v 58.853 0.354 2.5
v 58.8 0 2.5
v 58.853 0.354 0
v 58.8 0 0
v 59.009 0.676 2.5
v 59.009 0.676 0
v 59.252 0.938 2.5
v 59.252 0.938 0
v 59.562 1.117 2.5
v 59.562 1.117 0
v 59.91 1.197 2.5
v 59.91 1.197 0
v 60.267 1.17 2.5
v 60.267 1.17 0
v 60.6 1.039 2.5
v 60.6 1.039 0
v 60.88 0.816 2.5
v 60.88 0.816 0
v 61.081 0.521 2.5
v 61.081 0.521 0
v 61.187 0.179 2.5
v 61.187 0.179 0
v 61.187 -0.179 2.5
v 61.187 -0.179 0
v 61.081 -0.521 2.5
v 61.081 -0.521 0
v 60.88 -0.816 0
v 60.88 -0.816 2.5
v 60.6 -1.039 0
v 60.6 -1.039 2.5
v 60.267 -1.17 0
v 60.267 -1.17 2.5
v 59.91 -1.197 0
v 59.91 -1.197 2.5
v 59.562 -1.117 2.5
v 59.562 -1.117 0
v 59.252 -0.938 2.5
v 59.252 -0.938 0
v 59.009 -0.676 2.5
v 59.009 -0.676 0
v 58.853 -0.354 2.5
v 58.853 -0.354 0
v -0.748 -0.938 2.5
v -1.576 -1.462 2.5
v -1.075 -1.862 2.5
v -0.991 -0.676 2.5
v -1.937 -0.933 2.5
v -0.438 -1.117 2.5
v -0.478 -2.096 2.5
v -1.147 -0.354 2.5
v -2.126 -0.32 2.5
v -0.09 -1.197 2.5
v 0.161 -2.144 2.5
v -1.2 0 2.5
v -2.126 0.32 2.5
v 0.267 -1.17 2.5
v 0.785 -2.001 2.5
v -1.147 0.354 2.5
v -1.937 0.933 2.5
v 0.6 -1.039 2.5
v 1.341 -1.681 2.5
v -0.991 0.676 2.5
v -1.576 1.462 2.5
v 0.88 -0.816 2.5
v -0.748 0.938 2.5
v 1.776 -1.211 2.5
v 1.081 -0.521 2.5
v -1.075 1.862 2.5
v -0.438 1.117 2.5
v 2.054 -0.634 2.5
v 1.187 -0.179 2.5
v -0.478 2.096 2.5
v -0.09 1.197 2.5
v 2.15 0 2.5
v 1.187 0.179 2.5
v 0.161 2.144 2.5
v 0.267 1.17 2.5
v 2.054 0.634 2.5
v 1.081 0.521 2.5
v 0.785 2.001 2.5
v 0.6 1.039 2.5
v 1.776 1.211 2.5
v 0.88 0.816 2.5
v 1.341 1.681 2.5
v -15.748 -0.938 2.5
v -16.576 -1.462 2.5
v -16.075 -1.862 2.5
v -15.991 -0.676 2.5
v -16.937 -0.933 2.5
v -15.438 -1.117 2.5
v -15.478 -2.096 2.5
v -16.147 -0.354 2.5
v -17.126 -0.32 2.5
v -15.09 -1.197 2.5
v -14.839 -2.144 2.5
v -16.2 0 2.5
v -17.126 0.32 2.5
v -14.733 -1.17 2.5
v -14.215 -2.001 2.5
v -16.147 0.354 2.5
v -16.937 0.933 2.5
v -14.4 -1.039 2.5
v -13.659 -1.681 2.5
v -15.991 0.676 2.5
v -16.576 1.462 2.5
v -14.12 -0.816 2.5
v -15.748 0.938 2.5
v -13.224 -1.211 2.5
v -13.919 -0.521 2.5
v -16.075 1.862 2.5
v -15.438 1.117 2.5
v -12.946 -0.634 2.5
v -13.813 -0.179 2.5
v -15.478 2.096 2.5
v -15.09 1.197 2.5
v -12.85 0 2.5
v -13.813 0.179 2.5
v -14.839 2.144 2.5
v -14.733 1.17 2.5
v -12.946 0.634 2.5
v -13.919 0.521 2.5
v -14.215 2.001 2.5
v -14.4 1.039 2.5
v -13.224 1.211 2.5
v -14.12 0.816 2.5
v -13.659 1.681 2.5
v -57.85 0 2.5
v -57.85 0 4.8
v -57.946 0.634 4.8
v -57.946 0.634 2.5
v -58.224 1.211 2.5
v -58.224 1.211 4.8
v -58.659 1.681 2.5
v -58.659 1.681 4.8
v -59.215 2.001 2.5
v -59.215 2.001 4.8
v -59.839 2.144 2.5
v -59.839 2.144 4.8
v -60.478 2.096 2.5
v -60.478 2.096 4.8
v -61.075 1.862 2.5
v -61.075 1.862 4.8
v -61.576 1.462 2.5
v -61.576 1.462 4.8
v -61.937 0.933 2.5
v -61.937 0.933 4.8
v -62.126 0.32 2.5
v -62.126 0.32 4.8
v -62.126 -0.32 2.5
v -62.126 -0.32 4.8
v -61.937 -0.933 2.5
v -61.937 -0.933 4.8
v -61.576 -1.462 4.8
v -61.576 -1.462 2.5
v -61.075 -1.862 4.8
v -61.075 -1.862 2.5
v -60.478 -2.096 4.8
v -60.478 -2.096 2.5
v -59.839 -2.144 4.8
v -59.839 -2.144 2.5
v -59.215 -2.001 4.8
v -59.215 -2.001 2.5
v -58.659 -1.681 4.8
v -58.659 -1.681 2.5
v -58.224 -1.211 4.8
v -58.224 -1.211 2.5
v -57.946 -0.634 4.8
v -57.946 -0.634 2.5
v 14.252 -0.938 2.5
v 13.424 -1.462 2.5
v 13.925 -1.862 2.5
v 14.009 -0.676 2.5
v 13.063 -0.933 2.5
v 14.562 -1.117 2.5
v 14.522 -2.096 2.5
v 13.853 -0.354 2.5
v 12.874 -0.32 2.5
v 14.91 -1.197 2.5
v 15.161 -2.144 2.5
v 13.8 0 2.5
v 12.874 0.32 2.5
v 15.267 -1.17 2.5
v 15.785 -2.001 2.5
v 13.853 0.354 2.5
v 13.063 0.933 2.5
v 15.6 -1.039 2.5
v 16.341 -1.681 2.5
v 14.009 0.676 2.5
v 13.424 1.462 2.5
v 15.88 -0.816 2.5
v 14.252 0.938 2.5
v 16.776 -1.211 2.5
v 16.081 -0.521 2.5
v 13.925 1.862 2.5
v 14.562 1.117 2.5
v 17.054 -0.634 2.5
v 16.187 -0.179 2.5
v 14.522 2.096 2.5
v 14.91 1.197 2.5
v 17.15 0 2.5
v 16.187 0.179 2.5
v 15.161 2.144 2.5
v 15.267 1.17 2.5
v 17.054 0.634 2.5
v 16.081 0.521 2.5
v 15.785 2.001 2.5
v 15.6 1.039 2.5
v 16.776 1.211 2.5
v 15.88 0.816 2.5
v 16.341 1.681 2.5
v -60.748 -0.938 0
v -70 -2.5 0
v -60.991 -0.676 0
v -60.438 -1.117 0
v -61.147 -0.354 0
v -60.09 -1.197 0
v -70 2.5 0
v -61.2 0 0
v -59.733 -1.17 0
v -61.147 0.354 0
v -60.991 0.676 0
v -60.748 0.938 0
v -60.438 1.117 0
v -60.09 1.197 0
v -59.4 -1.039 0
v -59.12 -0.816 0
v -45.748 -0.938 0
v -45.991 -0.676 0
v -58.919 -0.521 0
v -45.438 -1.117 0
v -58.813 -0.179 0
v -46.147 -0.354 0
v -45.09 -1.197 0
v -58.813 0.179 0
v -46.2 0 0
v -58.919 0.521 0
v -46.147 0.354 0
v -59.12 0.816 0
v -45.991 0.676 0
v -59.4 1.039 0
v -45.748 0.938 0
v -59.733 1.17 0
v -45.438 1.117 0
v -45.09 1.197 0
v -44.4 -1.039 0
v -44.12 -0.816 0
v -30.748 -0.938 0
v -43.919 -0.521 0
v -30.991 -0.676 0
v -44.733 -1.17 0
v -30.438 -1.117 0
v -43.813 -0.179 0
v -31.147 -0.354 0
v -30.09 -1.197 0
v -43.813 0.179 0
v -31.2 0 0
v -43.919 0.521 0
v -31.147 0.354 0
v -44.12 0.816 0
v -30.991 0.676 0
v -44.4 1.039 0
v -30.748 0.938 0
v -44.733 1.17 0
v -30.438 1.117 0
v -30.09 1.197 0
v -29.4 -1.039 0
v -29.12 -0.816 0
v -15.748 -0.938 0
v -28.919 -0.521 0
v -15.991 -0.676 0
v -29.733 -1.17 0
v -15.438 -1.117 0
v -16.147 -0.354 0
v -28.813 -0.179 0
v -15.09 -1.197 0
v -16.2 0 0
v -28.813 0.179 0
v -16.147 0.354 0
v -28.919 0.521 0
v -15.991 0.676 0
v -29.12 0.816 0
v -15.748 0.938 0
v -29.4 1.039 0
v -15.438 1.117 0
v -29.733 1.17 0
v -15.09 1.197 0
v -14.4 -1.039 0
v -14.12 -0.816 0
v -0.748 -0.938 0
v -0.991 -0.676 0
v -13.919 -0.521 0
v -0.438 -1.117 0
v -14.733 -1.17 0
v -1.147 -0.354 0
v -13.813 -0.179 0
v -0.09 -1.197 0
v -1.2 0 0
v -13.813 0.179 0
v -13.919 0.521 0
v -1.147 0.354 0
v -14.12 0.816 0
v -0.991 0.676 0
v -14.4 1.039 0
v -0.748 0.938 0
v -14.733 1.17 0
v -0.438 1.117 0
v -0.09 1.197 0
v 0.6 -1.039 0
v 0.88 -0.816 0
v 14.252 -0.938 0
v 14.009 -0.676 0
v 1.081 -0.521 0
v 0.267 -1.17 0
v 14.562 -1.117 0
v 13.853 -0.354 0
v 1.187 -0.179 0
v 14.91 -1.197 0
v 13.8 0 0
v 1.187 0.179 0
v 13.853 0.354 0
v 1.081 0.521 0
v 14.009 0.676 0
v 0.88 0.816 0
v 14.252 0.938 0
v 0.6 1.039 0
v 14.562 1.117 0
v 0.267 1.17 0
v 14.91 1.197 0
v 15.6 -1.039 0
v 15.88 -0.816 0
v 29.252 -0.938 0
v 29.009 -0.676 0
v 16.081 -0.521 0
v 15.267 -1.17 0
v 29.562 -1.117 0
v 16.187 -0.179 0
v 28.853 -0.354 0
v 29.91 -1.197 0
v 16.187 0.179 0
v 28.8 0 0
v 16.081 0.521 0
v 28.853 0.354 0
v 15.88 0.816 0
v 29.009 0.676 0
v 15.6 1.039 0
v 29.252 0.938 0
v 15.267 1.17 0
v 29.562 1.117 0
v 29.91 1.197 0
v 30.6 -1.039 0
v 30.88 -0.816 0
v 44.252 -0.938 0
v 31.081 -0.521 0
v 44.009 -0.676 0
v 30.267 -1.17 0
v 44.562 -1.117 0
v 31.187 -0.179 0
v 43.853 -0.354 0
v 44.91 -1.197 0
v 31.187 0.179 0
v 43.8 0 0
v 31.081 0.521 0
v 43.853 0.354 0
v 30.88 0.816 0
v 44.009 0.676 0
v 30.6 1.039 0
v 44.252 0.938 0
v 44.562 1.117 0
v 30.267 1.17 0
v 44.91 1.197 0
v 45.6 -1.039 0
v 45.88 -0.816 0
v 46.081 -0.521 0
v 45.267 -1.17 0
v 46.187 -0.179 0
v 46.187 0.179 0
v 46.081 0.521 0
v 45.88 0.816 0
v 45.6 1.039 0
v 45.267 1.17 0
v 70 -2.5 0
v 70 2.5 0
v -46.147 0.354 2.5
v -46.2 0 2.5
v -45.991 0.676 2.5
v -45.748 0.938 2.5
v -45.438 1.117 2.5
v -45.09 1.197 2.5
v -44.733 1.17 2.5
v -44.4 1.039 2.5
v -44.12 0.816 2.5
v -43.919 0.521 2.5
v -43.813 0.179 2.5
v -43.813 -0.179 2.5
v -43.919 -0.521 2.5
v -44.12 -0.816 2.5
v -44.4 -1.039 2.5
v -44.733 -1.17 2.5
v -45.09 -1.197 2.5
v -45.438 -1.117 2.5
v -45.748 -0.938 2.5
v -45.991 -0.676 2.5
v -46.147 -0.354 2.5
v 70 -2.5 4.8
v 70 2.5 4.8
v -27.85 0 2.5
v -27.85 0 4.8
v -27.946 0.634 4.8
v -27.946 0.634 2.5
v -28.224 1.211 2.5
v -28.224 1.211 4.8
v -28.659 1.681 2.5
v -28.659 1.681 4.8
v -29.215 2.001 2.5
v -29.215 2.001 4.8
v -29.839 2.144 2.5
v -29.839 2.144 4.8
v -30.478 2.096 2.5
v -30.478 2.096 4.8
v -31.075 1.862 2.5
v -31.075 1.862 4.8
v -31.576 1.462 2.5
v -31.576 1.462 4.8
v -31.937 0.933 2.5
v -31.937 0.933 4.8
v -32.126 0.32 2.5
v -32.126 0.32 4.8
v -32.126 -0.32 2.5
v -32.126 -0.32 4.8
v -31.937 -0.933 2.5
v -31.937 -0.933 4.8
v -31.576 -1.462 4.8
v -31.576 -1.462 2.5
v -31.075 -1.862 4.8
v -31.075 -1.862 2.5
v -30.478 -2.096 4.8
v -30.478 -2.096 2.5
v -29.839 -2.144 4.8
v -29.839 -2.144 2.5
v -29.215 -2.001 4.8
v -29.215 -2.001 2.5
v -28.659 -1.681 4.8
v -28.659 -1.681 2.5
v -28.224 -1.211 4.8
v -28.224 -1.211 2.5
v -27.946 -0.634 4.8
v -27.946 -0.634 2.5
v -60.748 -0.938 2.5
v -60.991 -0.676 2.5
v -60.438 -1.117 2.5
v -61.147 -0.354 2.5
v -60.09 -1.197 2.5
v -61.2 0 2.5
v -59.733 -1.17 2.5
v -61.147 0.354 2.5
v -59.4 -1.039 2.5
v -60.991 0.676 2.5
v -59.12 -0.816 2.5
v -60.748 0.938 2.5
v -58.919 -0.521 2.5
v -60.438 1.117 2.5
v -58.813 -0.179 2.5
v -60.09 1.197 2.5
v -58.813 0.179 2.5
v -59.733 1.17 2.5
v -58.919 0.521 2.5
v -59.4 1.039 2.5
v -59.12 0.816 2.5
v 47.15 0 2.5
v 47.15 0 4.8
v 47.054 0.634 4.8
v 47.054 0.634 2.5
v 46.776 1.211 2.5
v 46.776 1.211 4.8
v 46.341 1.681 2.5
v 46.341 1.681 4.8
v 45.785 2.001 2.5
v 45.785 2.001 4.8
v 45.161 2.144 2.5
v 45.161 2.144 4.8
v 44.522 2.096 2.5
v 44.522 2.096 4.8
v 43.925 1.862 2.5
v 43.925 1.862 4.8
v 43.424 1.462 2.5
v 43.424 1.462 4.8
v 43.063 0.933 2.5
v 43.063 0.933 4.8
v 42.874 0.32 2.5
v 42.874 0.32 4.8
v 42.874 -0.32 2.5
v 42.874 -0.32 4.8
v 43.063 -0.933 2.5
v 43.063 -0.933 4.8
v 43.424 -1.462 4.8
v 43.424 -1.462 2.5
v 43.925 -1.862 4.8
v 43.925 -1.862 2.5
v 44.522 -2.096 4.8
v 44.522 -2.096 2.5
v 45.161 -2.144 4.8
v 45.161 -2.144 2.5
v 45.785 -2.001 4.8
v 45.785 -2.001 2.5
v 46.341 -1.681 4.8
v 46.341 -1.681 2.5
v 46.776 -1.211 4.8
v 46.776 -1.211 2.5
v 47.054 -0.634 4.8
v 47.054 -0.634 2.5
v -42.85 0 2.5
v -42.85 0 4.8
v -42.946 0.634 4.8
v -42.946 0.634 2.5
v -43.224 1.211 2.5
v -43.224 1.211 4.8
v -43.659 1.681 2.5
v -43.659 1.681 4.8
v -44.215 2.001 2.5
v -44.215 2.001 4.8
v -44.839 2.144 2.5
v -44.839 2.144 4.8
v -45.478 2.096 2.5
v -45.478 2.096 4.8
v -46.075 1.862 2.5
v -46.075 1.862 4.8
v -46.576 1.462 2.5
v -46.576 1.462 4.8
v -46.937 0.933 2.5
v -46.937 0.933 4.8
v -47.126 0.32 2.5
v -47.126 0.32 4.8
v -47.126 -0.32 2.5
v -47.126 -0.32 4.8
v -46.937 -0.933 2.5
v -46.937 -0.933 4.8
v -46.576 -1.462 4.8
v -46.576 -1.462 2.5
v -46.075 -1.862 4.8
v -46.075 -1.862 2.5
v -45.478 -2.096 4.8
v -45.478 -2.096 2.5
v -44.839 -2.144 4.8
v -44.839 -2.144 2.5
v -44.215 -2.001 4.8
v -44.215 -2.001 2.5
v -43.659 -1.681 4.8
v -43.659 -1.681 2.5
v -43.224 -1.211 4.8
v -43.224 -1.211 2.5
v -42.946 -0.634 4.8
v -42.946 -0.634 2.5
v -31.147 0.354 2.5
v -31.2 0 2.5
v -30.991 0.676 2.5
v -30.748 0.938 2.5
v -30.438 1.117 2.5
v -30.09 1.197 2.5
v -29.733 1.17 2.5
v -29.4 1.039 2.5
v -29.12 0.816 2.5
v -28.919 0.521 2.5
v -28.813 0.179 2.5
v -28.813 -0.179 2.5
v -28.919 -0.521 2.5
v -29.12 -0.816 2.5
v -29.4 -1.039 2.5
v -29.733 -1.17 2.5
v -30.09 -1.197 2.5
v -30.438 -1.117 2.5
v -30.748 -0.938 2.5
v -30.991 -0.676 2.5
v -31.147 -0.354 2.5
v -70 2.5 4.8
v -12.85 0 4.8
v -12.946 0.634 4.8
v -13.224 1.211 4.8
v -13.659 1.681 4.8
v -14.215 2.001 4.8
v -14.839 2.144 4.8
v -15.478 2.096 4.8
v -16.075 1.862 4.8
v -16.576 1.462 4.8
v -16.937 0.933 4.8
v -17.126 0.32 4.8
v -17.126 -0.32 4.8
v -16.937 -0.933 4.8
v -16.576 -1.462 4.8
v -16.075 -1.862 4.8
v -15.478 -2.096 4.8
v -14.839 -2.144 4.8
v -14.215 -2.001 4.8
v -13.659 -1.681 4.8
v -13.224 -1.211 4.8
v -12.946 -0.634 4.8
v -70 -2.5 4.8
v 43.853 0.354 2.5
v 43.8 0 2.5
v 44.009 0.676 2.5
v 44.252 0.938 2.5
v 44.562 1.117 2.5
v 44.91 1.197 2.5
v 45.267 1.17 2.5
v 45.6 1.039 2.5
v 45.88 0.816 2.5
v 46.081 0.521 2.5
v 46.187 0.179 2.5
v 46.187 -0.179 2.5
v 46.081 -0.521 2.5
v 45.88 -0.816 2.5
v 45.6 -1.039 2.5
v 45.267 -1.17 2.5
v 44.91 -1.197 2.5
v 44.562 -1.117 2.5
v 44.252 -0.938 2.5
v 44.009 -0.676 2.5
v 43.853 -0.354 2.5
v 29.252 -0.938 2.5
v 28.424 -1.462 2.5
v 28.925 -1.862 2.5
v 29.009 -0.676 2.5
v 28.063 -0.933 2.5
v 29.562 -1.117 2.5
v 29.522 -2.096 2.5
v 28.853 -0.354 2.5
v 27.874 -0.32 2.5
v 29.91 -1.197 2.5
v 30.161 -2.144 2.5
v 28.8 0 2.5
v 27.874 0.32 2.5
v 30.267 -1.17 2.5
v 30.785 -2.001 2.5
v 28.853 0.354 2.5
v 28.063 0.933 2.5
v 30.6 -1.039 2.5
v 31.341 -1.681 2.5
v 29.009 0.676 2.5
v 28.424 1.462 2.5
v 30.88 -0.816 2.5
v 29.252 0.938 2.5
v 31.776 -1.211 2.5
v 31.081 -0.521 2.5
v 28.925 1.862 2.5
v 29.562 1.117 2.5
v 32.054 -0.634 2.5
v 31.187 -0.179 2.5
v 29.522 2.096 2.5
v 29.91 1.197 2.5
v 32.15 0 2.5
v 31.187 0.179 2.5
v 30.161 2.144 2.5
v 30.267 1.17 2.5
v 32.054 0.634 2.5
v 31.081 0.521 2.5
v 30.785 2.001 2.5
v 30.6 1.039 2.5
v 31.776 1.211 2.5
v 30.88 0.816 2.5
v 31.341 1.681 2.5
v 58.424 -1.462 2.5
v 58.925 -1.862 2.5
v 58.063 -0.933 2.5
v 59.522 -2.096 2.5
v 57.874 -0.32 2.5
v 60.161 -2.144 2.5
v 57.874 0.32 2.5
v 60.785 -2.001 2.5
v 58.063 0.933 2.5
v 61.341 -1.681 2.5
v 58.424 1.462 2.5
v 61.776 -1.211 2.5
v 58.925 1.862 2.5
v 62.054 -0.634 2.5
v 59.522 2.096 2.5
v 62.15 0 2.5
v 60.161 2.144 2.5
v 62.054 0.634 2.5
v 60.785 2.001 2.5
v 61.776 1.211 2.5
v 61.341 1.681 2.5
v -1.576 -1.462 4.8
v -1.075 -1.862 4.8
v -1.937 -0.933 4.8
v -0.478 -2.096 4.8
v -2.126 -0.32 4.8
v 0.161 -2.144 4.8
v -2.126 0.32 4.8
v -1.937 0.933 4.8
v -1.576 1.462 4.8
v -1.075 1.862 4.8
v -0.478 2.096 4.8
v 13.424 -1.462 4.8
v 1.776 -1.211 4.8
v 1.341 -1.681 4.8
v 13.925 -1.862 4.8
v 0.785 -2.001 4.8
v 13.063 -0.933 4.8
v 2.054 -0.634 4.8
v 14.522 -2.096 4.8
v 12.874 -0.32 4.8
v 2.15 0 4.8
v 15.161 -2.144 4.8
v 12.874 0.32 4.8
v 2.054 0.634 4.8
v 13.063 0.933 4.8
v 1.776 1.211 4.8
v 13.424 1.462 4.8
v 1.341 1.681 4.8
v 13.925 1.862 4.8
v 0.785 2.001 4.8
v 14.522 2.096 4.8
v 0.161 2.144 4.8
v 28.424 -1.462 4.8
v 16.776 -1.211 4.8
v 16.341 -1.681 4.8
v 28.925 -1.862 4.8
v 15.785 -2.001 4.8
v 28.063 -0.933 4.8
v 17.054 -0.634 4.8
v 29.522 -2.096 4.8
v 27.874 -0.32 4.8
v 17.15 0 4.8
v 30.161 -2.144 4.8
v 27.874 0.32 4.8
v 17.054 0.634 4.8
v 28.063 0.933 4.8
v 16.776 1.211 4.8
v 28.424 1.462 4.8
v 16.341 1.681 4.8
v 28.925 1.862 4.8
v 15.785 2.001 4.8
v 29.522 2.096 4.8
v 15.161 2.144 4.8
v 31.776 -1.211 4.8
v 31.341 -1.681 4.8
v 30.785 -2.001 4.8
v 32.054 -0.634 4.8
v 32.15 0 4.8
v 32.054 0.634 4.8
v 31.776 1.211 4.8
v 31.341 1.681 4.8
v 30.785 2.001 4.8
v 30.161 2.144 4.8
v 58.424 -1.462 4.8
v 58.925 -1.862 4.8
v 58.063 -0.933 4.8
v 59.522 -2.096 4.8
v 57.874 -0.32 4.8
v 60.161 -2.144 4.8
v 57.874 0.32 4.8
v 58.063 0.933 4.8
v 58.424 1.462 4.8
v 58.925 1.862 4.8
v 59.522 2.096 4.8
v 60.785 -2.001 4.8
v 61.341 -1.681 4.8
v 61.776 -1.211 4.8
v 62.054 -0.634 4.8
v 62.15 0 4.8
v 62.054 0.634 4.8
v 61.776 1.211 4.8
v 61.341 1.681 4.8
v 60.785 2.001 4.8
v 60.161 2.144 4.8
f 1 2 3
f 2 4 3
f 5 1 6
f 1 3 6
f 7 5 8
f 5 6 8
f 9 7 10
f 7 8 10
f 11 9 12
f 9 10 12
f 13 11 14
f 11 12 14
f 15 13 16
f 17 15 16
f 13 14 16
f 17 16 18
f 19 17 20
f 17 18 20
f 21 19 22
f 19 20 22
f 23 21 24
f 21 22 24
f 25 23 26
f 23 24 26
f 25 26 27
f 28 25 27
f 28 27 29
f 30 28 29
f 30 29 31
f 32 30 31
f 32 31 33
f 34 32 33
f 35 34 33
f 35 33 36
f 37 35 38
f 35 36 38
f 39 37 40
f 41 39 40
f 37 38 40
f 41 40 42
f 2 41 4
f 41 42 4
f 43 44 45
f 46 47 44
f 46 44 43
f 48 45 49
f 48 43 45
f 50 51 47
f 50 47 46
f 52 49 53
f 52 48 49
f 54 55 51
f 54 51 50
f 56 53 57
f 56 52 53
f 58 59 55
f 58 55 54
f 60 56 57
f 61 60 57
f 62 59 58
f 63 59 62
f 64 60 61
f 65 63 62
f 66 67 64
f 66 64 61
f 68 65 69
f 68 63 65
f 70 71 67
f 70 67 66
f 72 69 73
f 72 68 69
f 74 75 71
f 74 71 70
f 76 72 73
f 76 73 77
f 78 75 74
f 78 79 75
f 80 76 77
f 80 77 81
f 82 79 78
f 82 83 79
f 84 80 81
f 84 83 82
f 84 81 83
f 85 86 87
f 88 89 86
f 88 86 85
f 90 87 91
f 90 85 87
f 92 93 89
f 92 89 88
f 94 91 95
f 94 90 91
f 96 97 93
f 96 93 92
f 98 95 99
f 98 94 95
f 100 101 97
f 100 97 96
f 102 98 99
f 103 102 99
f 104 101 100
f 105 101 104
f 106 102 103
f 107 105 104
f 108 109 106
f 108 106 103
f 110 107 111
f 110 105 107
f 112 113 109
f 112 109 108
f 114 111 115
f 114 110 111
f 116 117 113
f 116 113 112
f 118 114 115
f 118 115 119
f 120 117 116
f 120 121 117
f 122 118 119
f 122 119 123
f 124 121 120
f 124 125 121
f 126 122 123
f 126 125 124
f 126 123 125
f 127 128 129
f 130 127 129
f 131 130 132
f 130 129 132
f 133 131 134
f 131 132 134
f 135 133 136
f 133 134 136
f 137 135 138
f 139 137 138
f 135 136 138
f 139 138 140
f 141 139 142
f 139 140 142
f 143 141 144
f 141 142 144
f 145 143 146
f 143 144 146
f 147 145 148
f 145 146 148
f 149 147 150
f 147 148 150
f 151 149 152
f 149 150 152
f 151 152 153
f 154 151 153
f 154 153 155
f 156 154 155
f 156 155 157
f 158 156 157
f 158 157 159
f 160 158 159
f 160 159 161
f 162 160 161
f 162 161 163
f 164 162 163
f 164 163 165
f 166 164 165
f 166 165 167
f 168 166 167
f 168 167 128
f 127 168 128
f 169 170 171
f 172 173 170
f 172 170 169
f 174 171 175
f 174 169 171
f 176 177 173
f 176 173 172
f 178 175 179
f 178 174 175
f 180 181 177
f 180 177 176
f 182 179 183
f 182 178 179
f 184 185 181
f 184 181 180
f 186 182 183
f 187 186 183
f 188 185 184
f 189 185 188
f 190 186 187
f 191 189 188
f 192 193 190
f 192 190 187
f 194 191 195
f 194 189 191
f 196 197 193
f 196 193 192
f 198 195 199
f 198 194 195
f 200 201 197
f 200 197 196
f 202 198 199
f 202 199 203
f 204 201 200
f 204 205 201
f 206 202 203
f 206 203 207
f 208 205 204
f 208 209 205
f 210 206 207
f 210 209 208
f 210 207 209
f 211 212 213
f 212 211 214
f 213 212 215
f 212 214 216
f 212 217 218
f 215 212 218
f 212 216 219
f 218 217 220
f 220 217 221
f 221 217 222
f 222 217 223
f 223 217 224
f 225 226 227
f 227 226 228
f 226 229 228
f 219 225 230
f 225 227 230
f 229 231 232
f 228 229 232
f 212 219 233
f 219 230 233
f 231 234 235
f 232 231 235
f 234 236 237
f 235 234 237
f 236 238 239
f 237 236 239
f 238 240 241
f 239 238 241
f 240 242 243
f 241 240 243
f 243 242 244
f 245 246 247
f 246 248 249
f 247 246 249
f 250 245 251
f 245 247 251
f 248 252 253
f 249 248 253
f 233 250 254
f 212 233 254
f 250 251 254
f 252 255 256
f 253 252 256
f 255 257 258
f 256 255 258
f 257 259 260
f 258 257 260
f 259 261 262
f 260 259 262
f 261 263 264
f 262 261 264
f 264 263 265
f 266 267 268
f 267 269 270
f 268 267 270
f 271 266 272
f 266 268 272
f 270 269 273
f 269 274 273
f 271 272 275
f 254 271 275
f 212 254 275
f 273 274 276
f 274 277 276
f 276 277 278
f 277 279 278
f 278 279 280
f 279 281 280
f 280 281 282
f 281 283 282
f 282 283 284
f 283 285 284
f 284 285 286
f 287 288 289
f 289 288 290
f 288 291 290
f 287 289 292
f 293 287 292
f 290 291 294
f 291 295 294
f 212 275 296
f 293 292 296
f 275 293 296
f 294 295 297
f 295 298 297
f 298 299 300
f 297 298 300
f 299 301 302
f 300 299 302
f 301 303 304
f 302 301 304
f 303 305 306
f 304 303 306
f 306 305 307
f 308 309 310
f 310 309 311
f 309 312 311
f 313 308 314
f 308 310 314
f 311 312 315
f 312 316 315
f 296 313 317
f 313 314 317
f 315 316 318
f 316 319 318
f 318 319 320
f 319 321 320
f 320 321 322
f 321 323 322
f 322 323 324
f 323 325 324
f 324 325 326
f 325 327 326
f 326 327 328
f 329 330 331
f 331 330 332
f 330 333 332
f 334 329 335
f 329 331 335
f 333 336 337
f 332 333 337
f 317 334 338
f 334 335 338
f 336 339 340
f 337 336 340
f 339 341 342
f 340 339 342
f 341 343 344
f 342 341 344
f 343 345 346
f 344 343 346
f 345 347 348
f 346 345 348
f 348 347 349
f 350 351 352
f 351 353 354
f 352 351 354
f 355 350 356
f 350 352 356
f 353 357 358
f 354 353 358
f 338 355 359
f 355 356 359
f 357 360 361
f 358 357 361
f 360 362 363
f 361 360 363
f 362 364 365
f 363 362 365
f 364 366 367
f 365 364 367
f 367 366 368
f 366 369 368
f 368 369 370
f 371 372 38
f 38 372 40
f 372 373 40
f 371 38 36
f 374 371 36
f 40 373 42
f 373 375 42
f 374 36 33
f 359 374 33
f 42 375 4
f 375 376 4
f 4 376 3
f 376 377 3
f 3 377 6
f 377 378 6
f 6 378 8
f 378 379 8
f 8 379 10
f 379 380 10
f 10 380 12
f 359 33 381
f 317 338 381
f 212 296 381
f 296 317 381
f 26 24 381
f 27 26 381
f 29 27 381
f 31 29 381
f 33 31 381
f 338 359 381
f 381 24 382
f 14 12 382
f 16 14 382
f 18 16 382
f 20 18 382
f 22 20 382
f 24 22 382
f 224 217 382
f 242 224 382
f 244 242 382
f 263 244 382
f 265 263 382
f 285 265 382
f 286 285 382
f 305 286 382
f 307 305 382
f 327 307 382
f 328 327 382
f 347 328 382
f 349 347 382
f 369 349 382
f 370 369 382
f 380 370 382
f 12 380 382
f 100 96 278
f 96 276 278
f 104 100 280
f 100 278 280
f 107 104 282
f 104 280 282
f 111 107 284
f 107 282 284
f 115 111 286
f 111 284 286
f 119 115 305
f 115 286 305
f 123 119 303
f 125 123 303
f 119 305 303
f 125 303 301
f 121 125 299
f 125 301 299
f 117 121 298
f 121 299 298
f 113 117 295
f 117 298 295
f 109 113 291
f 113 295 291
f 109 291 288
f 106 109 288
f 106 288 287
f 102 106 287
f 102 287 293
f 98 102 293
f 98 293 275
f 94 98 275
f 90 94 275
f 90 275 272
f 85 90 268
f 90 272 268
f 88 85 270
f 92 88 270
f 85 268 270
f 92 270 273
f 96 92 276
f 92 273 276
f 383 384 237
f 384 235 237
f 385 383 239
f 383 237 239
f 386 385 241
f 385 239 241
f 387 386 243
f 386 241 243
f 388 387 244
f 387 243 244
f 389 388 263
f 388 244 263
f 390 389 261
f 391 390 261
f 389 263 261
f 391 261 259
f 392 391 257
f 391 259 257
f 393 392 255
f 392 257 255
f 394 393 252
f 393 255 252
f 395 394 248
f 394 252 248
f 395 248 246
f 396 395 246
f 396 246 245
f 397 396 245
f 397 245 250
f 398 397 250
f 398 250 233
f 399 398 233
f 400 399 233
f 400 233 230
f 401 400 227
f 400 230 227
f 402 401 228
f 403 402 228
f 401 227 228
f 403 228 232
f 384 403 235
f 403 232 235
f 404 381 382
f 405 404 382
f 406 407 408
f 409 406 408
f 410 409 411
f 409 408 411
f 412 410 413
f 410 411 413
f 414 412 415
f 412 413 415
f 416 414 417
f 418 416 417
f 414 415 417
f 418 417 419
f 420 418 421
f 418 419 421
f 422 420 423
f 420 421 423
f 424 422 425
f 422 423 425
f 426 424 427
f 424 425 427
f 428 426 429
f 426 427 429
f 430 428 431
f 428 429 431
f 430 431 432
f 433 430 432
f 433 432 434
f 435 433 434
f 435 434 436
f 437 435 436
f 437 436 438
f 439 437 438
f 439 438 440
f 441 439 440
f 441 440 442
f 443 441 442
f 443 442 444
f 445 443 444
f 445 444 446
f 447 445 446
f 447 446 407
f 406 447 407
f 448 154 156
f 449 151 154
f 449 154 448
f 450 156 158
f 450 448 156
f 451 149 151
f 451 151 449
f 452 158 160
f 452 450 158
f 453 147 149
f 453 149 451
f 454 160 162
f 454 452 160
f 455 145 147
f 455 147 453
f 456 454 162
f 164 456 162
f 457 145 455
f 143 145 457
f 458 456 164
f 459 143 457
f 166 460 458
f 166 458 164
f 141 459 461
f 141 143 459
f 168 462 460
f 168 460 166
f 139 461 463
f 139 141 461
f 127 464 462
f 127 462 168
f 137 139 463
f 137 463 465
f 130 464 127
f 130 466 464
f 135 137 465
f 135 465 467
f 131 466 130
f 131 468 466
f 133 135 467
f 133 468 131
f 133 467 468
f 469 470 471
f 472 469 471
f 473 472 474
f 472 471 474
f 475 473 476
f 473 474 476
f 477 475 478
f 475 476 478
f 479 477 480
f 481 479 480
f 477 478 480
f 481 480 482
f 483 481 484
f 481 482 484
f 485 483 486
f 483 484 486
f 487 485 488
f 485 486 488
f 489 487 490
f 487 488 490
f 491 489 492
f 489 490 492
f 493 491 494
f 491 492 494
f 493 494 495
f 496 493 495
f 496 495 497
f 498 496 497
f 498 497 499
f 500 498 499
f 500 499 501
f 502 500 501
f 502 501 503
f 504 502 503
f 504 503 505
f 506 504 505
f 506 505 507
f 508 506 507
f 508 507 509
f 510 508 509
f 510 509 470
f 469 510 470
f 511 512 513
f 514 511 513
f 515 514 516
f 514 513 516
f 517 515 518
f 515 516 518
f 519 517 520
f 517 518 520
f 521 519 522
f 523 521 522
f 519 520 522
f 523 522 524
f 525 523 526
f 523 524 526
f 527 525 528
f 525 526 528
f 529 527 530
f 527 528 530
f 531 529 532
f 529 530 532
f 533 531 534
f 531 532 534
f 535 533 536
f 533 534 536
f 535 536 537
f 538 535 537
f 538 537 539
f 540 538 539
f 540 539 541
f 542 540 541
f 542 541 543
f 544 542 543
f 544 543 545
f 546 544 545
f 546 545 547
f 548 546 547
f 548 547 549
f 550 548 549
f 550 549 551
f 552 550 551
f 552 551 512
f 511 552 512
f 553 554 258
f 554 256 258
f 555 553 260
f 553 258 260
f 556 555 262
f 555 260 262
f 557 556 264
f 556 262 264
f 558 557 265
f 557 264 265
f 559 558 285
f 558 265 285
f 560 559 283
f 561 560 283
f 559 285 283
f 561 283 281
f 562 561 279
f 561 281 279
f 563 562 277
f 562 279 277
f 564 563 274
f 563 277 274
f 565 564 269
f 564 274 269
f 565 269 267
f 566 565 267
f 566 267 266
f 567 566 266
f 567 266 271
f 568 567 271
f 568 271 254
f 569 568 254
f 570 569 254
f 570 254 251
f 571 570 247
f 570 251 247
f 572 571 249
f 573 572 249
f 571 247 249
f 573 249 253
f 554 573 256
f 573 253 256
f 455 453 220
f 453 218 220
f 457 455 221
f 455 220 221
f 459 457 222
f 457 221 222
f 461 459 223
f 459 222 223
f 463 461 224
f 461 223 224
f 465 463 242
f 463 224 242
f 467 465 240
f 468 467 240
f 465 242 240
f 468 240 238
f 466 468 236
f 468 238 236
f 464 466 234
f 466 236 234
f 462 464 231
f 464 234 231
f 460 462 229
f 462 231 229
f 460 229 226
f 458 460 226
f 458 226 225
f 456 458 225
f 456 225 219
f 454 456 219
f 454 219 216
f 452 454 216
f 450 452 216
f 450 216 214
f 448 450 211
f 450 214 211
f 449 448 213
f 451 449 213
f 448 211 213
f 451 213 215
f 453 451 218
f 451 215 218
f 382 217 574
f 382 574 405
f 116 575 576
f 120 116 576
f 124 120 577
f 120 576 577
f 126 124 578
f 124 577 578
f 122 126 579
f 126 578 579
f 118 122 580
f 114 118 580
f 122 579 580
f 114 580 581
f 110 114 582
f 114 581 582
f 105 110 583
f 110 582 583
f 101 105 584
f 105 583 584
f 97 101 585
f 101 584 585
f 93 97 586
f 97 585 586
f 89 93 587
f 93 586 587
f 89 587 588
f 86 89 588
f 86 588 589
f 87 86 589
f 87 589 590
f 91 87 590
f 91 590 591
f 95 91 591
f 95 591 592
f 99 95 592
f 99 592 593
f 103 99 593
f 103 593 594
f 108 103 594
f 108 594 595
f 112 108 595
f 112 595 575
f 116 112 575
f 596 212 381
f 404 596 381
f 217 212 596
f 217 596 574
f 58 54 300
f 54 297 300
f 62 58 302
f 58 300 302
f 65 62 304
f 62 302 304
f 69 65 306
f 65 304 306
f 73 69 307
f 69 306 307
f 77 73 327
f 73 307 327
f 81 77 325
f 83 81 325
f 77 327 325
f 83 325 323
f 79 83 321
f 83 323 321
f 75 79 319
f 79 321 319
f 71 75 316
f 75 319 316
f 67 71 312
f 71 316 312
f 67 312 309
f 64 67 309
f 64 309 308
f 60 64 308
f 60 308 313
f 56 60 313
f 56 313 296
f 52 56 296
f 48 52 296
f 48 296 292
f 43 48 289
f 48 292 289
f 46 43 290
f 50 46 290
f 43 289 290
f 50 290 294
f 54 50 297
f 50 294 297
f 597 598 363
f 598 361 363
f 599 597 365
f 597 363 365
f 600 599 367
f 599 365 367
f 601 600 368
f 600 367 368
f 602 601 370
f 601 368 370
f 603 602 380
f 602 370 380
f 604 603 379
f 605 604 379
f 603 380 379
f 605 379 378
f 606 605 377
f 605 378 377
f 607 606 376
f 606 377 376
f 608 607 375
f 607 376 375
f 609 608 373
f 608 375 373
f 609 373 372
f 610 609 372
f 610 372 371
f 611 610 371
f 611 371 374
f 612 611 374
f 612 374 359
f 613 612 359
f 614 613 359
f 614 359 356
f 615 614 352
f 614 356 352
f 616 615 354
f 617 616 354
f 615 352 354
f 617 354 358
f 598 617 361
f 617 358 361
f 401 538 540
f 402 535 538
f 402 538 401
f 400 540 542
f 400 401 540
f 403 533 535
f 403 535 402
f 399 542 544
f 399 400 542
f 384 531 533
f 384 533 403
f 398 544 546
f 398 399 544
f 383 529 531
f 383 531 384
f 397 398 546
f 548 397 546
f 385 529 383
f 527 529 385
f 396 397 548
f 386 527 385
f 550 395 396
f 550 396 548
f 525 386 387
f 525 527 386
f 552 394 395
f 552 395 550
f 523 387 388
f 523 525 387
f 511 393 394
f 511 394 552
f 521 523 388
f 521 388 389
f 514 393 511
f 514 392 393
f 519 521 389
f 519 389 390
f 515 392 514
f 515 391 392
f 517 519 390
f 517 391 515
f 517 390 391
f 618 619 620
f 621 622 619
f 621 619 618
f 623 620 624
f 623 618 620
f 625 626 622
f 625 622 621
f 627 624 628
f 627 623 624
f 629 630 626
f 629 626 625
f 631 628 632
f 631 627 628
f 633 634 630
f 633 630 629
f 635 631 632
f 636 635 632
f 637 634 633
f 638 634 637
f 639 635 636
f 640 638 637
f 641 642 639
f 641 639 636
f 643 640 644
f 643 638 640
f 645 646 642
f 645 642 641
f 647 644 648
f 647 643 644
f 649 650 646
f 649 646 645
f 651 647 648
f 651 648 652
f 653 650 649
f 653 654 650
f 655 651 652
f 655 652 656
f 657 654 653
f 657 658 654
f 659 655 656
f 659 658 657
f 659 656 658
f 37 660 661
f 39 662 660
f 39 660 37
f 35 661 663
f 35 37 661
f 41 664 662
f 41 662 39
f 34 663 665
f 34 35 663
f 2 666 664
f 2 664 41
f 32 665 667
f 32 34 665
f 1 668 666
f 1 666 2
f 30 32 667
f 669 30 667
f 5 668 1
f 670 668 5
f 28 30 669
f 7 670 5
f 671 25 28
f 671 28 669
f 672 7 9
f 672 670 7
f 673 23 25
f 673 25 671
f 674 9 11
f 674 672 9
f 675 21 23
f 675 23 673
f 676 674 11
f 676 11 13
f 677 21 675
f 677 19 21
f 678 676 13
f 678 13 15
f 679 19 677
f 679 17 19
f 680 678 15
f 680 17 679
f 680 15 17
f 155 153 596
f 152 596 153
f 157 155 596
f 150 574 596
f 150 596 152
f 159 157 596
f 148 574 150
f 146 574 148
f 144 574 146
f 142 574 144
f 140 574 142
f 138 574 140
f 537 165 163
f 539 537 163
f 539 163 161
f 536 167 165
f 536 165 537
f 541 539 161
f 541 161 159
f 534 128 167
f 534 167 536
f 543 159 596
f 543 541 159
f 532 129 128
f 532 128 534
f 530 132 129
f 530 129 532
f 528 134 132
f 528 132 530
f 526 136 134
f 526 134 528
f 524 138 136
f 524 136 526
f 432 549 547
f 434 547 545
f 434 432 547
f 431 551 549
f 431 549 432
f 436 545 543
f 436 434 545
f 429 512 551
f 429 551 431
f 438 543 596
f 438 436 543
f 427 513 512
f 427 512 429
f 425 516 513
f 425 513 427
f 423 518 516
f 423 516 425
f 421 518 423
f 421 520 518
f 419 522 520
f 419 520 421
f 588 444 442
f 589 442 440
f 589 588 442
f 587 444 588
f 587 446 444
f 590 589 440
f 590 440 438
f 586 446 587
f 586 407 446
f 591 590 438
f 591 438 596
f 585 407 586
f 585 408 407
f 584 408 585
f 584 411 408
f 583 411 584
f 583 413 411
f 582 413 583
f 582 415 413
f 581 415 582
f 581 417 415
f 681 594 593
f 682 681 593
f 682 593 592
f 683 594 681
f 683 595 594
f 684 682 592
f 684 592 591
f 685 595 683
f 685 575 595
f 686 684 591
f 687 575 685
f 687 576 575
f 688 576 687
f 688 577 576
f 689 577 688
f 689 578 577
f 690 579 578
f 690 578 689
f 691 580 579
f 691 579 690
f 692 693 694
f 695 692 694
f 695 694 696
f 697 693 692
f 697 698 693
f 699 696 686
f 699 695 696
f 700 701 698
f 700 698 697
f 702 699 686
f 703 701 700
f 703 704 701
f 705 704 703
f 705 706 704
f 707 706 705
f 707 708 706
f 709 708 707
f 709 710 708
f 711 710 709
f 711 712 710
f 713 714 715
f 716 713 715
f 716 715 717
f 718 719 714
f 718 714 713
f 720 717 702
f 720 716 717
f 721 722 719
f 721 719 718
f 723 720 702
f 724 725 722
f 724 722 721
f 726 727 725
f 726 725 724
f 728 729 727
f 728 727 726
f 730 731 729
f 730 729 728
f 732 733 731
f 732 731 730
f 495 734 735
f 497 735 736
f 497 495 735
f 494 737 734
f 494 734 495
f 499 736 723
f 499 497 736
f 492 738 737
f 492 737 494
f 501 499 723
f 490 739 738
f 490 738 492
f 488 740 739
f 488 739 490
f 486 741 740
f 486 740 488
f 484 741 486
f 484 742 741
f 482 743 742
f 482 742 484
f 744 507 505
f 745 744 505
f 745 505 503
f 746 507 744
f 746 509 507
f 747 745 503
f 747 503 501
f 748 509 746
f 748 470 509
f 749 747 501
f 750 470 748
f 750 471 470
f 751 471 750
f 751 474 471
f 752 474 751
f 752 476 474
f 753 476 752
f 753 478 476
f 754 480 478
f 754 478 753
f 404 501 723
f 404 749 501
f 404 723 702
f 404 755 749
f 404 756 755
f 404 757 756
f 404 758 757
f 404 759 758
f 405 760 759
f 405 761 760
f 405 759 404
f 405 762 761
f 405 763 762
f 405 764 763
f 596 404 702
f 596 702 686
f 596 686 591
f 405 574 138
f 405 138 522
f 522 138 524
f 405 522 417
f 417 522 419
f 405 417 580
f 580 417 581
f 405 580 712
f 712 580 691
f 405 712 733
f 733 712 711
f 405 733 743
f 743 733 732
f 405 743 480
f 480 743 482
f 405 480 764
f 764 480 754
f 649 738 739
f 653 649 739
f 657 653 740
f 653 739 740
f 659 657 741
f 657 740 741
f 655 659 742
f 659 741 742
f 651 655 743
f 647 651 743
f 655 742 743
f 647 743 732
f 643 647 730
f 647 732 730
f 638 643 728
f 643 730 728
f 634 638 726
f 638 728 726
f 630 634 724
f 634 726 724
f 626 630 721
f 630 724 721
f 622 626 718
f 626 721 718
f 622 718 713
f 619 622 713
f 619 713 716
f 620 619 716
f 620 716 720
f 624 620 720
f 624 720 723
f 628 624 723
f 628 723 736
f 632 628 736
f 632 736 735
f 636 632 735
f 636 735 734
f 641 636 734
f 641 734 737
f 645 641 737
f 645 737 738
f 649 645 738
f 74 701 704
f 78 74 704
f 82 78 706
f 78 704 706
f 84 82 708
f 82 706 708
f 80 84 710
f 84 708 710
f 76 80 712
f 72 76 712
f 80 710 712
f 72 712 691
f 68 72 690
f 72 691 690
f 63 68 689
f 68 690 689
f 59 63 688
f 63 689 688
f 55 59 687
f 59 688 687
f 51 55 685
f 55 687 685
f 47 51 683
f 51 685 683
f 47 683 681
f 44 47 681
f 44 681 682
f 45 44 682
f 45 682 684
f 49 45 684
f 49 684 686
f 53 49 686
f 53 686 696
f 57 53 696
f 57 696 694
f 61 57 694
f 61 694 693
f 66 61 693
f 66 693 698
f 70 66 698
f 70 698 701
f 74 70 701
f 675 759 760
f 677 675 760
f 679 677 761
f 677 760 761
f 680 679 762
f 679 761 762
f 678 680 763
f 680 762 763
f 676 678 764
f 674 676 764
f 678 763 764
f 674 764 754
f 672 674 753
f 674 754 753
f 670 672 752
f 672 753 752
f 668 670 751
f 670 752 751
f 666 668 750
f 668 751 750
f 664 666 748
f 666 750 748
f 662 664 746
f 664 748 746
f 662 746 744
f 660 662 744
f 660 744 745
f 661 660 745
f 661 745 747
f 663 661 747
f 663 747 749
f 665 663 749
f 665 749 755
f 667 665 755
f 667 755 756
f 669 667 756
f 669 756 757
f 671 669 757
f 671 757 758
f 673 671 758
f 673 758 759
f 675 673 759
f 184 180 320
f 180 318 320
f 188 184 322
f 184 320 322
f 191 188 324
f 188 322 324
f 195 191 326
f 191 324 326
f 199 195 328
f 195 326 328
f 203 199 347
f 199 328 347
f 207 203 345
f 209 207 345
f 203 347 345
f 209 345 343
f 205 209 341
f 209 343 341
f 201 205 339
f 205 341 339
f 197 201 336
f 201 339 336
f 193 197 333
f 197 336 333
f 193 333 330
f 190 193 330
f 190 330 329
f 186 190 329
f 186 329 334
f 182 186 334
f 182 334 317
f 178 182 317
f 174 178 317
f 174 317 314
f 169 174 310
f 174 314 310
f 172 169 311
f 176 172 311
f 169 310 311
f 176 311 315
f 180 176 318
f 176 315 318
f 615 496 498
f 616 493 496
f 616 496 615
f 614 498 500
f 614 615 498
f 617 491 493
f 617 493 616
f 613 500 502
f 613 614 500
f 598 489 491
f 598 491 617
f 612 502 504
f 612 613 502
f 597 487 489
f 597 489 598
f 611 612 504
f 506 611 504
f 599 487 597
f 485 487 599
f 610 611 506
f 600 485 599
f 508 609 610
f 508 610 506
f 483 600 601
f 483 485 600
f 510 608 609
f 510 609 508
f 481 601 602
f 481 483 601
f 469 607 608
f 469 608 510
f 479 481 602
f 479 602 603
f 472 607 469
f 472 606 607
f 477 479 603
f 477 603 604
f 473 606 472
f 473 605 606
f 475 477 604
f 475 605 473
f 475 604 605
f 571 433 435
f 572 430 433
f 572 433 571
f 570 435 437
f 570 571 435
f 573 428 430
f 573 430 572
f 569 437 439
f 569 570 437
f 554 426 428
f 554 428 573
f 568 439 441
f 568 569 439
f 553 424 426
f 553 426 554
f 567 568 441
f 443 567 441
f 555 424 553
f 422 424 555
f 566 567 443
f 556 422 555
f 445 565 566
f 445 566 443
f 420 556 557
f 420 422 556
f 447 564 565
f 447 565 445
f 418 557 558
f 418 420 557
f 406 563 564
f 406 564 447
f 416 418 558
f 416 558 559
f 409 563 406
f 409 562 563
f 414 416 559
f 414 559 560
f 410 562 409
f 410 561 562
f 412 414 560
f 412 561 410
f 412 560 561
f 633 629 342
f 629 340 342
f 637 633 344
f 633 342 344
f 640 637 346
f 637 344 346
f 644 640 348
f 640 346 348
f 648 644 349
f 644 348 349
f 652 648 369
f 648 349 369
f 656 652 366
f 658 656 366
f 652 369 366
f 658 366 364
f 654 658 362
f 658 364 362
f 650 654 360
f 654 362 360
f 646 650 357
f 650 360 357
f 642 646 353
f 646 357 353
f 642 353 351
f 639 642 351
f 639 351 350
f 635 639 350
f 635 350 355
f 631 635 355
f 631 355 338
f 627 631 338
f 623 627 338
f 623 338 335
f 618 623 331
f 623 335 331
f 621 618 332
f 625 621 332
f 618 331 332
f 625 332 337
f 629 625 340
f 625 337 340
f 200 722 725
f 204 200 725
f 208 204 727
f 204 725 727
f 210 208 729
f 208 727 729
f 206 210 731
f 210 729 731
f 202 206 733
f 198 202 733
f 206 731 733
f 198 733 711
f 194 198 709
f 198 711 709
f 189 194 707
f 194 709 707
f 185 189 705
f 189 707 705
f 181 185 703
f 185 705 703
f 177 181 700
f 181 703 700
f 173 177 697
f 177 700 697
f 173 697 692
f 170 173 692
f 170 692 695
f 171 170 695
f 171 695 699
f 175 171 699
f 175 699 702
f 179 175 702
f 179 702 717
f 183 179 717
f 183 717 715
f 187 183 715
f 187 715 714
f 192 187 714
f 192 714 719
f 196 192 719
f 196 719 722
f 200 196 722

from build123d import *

# Parameters (mm, degrees)
SKETCH_1_W                = 140
SKETCH_1_H                = 5
EXTRUDE_1_DEPTH           = 4.8
HOLE_WIZARD_1_D           = 2.4
HOLE_WIZARD_1_DEPTH       = 5.2
HOLE_WIZARD_1_CBORE_D     = 4.3
HOLE_WIZARD_1_CBORE_DEPTH = 2.3
HOLE_WIZARD_1_TIP         = 0.721032743


with BuildPart() as part:
    # 草图1 → 凸台-拉伸1 (new body)
    with BuildSketch(Plane.XY):
        Rectangle(SKETCH_1_W, SKETCH_1_H)
    extrude(amount=EXTRUDE_1_DEPTH)

    # 打孔尺寸(%根据)内六角圆柱头螺钉的类型1
    with Locations(Plane.XY.offset(4.8)):
        with Locations((-60, 0), (-45, 0), (-30, 0), (-15, 0), (0, 0), (15, 0), (30, 0), (45, 0), (60, 0)):
            CounterBoreHole(HOLE_WIZARD_1_D / 2, HOLE_WIZARD_1_CBORE_D / 2, HOLE_WIZARD_1_CBORE_DEPTH, depth=HOLE_WIZARD_1_DEPTH)
            with Locations((0, 0, -(HOLE_WIZARD_1_DEPTH + HOLE_WIZARD_1_TIP / 2))):  # 118° drill point
                Cone(0, HOLE_WIZARD_1_D / 2, HOLE_WIZARD_1_TIP, mode=Mode.SUBTRACT)


solid = part.part
